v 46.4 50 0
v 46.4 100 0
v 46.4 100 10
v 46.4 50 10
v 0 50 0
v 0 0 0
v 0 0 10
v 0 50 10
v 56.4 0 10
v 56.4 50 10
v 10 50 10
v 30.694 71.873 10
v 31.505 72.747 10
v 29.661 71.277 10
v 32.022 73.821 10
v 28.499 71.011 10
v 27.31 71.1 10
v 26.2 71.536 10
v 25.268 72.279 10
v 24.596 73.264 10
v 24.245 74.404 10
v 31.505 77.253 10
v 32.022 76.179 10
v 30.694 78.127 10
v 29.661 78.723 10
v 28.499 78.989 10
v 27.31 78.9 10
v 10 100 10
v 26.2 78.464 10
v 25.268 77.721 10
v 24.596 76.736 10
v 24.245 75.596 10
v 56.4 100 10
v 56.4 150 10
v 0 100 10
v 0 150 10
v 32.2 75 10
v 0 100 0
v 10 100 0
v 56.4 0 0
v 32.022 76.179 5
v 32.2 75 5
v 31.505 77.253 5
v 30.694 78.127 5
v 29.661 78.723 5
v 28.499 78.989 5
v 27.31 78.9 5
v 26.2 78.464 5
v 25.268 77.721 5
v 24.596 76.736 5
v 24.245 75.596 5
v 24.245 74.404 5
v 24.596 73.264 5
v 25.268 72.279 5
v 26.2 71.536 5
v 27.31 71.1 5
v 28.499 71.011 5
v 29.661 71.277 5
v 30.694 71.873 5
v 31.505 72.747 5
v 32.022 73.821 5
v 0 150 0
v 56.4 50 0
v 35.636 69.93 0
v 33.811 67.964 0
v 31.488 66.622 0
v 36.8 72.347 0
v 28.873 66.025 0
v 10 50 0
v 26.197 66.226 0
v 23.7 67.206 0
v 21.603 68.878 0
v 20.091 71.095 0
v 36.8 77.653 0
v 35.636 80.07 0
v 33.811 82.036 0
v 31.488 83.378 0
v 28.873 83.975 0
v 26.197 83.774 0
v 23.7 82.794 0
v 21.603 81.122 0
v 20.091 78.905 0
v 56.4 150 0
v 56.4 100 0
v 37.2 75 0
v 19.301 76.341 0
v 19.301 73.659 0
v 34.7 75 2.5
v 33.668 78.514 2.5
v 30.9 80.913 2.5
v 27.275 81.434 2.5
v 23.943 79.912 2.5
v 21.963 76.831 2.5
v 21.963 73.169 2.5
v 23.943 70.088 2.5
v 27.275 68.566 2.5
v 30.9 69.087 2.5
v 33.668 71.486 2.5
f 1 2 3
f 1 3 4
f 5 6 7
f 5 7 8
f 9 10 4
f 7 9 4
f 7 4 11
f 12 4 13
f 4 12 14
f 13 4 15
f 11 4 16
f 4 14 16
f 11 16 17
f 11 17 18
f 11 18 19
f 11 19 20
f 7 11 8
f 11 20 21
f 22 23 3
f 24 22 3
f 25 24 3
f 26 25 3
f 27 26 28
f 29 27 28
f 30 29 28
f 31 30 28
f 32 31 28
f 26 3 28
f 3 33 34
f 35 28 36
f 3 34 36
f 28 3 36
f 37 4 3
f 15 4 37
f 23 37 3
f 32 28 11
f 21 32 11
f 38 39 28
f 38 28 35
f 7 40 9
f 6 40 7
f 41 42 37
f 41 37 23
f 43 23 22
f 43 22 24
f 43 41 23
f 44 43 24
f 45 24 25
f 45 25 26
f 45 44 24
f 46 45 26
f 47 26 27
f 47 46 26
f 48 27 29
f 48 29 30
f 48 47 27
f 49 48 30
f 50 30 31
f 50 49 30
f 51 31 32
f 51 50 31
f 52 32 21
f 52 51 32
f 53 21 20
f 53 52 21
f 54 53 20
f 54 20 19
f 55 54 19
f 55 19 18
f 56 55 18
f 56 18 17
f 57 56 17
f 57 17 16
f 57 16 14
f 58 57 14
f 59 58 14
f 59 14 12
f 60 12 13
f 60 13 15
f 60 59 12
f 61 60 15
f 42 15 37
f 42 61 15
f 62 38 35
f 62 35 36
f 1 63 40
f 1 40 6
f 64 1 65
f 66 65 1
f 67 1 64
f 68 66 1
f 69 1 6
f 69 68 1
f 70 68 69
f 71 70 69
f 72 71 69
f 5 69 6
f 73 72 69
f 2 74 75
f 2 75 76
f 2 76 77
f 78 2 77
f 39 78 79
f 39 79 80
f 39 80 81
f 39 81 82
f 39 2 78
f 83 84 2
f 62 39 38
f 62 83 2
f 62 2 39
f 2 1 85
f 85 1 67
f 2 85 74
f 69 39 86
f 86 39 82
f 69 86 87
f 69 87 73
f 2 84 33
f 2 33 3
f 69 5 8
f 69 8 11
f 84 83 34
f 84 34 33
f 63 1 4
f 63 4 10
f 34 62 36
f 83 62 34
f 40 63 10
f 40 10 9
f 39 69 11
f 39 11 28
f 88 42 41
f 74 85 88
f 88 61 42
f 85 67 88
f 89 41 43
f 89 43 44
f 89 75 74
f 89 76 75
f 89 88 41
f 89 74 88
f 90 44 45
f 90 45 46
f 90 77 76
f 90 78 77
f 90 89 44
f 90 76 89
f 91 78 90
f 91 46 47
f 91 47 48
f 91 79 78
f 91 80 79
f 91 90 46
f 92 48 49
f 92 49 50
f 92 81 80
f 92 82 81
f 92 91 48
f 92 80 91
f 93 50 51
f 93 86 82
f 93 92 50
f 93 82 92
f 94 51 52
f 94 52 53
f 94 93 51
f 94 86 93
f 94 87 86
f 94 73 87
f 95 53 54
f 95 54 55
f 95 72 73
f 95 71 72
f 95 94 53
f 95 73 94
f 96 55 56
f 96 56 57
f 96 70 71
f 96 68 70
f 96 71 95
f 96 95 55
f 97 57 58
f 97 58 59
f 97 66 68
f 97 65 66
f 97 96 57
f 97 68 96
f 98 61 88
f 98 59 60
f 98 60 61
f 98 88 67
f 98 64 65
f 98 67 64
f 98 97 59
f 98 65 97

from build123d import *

# Parameters (mm, degrees)
SKETCH1_R           = 4
BOSS_EXTRUDE1_DEPTH = 10
CHAMFER1_SIZE       = 5


with BuildPart() as part:
    # Sketch1 → Boss-Extrude1 (new body)
    with BuildSketch(Plane.XY):
        Polygon((0, 150), (56.4, 150), (56.4, 100), (46.4, 100), (46.4, 50), (56.4, 50), (56.4, 0), (0, 0), (0, 50), (10, 50), (10, 100), (0, 100), align=None)
        with Locations((28.2, 75)):
            Circle(SKETCH1_R, mode=Mode.SUBTRACT)
    extrude(amount=BOSS_EXTRUDE1_DEPTH)

    # Chamfer1
    chamfer1_edges = [part.edges().sort_by_distance(p)[0] for p in [
        (24.2, 75, 0),
    ]]
    chamfer(chamfer1_edges, length=CHAMFER1_SIZE)


solid = part.part
